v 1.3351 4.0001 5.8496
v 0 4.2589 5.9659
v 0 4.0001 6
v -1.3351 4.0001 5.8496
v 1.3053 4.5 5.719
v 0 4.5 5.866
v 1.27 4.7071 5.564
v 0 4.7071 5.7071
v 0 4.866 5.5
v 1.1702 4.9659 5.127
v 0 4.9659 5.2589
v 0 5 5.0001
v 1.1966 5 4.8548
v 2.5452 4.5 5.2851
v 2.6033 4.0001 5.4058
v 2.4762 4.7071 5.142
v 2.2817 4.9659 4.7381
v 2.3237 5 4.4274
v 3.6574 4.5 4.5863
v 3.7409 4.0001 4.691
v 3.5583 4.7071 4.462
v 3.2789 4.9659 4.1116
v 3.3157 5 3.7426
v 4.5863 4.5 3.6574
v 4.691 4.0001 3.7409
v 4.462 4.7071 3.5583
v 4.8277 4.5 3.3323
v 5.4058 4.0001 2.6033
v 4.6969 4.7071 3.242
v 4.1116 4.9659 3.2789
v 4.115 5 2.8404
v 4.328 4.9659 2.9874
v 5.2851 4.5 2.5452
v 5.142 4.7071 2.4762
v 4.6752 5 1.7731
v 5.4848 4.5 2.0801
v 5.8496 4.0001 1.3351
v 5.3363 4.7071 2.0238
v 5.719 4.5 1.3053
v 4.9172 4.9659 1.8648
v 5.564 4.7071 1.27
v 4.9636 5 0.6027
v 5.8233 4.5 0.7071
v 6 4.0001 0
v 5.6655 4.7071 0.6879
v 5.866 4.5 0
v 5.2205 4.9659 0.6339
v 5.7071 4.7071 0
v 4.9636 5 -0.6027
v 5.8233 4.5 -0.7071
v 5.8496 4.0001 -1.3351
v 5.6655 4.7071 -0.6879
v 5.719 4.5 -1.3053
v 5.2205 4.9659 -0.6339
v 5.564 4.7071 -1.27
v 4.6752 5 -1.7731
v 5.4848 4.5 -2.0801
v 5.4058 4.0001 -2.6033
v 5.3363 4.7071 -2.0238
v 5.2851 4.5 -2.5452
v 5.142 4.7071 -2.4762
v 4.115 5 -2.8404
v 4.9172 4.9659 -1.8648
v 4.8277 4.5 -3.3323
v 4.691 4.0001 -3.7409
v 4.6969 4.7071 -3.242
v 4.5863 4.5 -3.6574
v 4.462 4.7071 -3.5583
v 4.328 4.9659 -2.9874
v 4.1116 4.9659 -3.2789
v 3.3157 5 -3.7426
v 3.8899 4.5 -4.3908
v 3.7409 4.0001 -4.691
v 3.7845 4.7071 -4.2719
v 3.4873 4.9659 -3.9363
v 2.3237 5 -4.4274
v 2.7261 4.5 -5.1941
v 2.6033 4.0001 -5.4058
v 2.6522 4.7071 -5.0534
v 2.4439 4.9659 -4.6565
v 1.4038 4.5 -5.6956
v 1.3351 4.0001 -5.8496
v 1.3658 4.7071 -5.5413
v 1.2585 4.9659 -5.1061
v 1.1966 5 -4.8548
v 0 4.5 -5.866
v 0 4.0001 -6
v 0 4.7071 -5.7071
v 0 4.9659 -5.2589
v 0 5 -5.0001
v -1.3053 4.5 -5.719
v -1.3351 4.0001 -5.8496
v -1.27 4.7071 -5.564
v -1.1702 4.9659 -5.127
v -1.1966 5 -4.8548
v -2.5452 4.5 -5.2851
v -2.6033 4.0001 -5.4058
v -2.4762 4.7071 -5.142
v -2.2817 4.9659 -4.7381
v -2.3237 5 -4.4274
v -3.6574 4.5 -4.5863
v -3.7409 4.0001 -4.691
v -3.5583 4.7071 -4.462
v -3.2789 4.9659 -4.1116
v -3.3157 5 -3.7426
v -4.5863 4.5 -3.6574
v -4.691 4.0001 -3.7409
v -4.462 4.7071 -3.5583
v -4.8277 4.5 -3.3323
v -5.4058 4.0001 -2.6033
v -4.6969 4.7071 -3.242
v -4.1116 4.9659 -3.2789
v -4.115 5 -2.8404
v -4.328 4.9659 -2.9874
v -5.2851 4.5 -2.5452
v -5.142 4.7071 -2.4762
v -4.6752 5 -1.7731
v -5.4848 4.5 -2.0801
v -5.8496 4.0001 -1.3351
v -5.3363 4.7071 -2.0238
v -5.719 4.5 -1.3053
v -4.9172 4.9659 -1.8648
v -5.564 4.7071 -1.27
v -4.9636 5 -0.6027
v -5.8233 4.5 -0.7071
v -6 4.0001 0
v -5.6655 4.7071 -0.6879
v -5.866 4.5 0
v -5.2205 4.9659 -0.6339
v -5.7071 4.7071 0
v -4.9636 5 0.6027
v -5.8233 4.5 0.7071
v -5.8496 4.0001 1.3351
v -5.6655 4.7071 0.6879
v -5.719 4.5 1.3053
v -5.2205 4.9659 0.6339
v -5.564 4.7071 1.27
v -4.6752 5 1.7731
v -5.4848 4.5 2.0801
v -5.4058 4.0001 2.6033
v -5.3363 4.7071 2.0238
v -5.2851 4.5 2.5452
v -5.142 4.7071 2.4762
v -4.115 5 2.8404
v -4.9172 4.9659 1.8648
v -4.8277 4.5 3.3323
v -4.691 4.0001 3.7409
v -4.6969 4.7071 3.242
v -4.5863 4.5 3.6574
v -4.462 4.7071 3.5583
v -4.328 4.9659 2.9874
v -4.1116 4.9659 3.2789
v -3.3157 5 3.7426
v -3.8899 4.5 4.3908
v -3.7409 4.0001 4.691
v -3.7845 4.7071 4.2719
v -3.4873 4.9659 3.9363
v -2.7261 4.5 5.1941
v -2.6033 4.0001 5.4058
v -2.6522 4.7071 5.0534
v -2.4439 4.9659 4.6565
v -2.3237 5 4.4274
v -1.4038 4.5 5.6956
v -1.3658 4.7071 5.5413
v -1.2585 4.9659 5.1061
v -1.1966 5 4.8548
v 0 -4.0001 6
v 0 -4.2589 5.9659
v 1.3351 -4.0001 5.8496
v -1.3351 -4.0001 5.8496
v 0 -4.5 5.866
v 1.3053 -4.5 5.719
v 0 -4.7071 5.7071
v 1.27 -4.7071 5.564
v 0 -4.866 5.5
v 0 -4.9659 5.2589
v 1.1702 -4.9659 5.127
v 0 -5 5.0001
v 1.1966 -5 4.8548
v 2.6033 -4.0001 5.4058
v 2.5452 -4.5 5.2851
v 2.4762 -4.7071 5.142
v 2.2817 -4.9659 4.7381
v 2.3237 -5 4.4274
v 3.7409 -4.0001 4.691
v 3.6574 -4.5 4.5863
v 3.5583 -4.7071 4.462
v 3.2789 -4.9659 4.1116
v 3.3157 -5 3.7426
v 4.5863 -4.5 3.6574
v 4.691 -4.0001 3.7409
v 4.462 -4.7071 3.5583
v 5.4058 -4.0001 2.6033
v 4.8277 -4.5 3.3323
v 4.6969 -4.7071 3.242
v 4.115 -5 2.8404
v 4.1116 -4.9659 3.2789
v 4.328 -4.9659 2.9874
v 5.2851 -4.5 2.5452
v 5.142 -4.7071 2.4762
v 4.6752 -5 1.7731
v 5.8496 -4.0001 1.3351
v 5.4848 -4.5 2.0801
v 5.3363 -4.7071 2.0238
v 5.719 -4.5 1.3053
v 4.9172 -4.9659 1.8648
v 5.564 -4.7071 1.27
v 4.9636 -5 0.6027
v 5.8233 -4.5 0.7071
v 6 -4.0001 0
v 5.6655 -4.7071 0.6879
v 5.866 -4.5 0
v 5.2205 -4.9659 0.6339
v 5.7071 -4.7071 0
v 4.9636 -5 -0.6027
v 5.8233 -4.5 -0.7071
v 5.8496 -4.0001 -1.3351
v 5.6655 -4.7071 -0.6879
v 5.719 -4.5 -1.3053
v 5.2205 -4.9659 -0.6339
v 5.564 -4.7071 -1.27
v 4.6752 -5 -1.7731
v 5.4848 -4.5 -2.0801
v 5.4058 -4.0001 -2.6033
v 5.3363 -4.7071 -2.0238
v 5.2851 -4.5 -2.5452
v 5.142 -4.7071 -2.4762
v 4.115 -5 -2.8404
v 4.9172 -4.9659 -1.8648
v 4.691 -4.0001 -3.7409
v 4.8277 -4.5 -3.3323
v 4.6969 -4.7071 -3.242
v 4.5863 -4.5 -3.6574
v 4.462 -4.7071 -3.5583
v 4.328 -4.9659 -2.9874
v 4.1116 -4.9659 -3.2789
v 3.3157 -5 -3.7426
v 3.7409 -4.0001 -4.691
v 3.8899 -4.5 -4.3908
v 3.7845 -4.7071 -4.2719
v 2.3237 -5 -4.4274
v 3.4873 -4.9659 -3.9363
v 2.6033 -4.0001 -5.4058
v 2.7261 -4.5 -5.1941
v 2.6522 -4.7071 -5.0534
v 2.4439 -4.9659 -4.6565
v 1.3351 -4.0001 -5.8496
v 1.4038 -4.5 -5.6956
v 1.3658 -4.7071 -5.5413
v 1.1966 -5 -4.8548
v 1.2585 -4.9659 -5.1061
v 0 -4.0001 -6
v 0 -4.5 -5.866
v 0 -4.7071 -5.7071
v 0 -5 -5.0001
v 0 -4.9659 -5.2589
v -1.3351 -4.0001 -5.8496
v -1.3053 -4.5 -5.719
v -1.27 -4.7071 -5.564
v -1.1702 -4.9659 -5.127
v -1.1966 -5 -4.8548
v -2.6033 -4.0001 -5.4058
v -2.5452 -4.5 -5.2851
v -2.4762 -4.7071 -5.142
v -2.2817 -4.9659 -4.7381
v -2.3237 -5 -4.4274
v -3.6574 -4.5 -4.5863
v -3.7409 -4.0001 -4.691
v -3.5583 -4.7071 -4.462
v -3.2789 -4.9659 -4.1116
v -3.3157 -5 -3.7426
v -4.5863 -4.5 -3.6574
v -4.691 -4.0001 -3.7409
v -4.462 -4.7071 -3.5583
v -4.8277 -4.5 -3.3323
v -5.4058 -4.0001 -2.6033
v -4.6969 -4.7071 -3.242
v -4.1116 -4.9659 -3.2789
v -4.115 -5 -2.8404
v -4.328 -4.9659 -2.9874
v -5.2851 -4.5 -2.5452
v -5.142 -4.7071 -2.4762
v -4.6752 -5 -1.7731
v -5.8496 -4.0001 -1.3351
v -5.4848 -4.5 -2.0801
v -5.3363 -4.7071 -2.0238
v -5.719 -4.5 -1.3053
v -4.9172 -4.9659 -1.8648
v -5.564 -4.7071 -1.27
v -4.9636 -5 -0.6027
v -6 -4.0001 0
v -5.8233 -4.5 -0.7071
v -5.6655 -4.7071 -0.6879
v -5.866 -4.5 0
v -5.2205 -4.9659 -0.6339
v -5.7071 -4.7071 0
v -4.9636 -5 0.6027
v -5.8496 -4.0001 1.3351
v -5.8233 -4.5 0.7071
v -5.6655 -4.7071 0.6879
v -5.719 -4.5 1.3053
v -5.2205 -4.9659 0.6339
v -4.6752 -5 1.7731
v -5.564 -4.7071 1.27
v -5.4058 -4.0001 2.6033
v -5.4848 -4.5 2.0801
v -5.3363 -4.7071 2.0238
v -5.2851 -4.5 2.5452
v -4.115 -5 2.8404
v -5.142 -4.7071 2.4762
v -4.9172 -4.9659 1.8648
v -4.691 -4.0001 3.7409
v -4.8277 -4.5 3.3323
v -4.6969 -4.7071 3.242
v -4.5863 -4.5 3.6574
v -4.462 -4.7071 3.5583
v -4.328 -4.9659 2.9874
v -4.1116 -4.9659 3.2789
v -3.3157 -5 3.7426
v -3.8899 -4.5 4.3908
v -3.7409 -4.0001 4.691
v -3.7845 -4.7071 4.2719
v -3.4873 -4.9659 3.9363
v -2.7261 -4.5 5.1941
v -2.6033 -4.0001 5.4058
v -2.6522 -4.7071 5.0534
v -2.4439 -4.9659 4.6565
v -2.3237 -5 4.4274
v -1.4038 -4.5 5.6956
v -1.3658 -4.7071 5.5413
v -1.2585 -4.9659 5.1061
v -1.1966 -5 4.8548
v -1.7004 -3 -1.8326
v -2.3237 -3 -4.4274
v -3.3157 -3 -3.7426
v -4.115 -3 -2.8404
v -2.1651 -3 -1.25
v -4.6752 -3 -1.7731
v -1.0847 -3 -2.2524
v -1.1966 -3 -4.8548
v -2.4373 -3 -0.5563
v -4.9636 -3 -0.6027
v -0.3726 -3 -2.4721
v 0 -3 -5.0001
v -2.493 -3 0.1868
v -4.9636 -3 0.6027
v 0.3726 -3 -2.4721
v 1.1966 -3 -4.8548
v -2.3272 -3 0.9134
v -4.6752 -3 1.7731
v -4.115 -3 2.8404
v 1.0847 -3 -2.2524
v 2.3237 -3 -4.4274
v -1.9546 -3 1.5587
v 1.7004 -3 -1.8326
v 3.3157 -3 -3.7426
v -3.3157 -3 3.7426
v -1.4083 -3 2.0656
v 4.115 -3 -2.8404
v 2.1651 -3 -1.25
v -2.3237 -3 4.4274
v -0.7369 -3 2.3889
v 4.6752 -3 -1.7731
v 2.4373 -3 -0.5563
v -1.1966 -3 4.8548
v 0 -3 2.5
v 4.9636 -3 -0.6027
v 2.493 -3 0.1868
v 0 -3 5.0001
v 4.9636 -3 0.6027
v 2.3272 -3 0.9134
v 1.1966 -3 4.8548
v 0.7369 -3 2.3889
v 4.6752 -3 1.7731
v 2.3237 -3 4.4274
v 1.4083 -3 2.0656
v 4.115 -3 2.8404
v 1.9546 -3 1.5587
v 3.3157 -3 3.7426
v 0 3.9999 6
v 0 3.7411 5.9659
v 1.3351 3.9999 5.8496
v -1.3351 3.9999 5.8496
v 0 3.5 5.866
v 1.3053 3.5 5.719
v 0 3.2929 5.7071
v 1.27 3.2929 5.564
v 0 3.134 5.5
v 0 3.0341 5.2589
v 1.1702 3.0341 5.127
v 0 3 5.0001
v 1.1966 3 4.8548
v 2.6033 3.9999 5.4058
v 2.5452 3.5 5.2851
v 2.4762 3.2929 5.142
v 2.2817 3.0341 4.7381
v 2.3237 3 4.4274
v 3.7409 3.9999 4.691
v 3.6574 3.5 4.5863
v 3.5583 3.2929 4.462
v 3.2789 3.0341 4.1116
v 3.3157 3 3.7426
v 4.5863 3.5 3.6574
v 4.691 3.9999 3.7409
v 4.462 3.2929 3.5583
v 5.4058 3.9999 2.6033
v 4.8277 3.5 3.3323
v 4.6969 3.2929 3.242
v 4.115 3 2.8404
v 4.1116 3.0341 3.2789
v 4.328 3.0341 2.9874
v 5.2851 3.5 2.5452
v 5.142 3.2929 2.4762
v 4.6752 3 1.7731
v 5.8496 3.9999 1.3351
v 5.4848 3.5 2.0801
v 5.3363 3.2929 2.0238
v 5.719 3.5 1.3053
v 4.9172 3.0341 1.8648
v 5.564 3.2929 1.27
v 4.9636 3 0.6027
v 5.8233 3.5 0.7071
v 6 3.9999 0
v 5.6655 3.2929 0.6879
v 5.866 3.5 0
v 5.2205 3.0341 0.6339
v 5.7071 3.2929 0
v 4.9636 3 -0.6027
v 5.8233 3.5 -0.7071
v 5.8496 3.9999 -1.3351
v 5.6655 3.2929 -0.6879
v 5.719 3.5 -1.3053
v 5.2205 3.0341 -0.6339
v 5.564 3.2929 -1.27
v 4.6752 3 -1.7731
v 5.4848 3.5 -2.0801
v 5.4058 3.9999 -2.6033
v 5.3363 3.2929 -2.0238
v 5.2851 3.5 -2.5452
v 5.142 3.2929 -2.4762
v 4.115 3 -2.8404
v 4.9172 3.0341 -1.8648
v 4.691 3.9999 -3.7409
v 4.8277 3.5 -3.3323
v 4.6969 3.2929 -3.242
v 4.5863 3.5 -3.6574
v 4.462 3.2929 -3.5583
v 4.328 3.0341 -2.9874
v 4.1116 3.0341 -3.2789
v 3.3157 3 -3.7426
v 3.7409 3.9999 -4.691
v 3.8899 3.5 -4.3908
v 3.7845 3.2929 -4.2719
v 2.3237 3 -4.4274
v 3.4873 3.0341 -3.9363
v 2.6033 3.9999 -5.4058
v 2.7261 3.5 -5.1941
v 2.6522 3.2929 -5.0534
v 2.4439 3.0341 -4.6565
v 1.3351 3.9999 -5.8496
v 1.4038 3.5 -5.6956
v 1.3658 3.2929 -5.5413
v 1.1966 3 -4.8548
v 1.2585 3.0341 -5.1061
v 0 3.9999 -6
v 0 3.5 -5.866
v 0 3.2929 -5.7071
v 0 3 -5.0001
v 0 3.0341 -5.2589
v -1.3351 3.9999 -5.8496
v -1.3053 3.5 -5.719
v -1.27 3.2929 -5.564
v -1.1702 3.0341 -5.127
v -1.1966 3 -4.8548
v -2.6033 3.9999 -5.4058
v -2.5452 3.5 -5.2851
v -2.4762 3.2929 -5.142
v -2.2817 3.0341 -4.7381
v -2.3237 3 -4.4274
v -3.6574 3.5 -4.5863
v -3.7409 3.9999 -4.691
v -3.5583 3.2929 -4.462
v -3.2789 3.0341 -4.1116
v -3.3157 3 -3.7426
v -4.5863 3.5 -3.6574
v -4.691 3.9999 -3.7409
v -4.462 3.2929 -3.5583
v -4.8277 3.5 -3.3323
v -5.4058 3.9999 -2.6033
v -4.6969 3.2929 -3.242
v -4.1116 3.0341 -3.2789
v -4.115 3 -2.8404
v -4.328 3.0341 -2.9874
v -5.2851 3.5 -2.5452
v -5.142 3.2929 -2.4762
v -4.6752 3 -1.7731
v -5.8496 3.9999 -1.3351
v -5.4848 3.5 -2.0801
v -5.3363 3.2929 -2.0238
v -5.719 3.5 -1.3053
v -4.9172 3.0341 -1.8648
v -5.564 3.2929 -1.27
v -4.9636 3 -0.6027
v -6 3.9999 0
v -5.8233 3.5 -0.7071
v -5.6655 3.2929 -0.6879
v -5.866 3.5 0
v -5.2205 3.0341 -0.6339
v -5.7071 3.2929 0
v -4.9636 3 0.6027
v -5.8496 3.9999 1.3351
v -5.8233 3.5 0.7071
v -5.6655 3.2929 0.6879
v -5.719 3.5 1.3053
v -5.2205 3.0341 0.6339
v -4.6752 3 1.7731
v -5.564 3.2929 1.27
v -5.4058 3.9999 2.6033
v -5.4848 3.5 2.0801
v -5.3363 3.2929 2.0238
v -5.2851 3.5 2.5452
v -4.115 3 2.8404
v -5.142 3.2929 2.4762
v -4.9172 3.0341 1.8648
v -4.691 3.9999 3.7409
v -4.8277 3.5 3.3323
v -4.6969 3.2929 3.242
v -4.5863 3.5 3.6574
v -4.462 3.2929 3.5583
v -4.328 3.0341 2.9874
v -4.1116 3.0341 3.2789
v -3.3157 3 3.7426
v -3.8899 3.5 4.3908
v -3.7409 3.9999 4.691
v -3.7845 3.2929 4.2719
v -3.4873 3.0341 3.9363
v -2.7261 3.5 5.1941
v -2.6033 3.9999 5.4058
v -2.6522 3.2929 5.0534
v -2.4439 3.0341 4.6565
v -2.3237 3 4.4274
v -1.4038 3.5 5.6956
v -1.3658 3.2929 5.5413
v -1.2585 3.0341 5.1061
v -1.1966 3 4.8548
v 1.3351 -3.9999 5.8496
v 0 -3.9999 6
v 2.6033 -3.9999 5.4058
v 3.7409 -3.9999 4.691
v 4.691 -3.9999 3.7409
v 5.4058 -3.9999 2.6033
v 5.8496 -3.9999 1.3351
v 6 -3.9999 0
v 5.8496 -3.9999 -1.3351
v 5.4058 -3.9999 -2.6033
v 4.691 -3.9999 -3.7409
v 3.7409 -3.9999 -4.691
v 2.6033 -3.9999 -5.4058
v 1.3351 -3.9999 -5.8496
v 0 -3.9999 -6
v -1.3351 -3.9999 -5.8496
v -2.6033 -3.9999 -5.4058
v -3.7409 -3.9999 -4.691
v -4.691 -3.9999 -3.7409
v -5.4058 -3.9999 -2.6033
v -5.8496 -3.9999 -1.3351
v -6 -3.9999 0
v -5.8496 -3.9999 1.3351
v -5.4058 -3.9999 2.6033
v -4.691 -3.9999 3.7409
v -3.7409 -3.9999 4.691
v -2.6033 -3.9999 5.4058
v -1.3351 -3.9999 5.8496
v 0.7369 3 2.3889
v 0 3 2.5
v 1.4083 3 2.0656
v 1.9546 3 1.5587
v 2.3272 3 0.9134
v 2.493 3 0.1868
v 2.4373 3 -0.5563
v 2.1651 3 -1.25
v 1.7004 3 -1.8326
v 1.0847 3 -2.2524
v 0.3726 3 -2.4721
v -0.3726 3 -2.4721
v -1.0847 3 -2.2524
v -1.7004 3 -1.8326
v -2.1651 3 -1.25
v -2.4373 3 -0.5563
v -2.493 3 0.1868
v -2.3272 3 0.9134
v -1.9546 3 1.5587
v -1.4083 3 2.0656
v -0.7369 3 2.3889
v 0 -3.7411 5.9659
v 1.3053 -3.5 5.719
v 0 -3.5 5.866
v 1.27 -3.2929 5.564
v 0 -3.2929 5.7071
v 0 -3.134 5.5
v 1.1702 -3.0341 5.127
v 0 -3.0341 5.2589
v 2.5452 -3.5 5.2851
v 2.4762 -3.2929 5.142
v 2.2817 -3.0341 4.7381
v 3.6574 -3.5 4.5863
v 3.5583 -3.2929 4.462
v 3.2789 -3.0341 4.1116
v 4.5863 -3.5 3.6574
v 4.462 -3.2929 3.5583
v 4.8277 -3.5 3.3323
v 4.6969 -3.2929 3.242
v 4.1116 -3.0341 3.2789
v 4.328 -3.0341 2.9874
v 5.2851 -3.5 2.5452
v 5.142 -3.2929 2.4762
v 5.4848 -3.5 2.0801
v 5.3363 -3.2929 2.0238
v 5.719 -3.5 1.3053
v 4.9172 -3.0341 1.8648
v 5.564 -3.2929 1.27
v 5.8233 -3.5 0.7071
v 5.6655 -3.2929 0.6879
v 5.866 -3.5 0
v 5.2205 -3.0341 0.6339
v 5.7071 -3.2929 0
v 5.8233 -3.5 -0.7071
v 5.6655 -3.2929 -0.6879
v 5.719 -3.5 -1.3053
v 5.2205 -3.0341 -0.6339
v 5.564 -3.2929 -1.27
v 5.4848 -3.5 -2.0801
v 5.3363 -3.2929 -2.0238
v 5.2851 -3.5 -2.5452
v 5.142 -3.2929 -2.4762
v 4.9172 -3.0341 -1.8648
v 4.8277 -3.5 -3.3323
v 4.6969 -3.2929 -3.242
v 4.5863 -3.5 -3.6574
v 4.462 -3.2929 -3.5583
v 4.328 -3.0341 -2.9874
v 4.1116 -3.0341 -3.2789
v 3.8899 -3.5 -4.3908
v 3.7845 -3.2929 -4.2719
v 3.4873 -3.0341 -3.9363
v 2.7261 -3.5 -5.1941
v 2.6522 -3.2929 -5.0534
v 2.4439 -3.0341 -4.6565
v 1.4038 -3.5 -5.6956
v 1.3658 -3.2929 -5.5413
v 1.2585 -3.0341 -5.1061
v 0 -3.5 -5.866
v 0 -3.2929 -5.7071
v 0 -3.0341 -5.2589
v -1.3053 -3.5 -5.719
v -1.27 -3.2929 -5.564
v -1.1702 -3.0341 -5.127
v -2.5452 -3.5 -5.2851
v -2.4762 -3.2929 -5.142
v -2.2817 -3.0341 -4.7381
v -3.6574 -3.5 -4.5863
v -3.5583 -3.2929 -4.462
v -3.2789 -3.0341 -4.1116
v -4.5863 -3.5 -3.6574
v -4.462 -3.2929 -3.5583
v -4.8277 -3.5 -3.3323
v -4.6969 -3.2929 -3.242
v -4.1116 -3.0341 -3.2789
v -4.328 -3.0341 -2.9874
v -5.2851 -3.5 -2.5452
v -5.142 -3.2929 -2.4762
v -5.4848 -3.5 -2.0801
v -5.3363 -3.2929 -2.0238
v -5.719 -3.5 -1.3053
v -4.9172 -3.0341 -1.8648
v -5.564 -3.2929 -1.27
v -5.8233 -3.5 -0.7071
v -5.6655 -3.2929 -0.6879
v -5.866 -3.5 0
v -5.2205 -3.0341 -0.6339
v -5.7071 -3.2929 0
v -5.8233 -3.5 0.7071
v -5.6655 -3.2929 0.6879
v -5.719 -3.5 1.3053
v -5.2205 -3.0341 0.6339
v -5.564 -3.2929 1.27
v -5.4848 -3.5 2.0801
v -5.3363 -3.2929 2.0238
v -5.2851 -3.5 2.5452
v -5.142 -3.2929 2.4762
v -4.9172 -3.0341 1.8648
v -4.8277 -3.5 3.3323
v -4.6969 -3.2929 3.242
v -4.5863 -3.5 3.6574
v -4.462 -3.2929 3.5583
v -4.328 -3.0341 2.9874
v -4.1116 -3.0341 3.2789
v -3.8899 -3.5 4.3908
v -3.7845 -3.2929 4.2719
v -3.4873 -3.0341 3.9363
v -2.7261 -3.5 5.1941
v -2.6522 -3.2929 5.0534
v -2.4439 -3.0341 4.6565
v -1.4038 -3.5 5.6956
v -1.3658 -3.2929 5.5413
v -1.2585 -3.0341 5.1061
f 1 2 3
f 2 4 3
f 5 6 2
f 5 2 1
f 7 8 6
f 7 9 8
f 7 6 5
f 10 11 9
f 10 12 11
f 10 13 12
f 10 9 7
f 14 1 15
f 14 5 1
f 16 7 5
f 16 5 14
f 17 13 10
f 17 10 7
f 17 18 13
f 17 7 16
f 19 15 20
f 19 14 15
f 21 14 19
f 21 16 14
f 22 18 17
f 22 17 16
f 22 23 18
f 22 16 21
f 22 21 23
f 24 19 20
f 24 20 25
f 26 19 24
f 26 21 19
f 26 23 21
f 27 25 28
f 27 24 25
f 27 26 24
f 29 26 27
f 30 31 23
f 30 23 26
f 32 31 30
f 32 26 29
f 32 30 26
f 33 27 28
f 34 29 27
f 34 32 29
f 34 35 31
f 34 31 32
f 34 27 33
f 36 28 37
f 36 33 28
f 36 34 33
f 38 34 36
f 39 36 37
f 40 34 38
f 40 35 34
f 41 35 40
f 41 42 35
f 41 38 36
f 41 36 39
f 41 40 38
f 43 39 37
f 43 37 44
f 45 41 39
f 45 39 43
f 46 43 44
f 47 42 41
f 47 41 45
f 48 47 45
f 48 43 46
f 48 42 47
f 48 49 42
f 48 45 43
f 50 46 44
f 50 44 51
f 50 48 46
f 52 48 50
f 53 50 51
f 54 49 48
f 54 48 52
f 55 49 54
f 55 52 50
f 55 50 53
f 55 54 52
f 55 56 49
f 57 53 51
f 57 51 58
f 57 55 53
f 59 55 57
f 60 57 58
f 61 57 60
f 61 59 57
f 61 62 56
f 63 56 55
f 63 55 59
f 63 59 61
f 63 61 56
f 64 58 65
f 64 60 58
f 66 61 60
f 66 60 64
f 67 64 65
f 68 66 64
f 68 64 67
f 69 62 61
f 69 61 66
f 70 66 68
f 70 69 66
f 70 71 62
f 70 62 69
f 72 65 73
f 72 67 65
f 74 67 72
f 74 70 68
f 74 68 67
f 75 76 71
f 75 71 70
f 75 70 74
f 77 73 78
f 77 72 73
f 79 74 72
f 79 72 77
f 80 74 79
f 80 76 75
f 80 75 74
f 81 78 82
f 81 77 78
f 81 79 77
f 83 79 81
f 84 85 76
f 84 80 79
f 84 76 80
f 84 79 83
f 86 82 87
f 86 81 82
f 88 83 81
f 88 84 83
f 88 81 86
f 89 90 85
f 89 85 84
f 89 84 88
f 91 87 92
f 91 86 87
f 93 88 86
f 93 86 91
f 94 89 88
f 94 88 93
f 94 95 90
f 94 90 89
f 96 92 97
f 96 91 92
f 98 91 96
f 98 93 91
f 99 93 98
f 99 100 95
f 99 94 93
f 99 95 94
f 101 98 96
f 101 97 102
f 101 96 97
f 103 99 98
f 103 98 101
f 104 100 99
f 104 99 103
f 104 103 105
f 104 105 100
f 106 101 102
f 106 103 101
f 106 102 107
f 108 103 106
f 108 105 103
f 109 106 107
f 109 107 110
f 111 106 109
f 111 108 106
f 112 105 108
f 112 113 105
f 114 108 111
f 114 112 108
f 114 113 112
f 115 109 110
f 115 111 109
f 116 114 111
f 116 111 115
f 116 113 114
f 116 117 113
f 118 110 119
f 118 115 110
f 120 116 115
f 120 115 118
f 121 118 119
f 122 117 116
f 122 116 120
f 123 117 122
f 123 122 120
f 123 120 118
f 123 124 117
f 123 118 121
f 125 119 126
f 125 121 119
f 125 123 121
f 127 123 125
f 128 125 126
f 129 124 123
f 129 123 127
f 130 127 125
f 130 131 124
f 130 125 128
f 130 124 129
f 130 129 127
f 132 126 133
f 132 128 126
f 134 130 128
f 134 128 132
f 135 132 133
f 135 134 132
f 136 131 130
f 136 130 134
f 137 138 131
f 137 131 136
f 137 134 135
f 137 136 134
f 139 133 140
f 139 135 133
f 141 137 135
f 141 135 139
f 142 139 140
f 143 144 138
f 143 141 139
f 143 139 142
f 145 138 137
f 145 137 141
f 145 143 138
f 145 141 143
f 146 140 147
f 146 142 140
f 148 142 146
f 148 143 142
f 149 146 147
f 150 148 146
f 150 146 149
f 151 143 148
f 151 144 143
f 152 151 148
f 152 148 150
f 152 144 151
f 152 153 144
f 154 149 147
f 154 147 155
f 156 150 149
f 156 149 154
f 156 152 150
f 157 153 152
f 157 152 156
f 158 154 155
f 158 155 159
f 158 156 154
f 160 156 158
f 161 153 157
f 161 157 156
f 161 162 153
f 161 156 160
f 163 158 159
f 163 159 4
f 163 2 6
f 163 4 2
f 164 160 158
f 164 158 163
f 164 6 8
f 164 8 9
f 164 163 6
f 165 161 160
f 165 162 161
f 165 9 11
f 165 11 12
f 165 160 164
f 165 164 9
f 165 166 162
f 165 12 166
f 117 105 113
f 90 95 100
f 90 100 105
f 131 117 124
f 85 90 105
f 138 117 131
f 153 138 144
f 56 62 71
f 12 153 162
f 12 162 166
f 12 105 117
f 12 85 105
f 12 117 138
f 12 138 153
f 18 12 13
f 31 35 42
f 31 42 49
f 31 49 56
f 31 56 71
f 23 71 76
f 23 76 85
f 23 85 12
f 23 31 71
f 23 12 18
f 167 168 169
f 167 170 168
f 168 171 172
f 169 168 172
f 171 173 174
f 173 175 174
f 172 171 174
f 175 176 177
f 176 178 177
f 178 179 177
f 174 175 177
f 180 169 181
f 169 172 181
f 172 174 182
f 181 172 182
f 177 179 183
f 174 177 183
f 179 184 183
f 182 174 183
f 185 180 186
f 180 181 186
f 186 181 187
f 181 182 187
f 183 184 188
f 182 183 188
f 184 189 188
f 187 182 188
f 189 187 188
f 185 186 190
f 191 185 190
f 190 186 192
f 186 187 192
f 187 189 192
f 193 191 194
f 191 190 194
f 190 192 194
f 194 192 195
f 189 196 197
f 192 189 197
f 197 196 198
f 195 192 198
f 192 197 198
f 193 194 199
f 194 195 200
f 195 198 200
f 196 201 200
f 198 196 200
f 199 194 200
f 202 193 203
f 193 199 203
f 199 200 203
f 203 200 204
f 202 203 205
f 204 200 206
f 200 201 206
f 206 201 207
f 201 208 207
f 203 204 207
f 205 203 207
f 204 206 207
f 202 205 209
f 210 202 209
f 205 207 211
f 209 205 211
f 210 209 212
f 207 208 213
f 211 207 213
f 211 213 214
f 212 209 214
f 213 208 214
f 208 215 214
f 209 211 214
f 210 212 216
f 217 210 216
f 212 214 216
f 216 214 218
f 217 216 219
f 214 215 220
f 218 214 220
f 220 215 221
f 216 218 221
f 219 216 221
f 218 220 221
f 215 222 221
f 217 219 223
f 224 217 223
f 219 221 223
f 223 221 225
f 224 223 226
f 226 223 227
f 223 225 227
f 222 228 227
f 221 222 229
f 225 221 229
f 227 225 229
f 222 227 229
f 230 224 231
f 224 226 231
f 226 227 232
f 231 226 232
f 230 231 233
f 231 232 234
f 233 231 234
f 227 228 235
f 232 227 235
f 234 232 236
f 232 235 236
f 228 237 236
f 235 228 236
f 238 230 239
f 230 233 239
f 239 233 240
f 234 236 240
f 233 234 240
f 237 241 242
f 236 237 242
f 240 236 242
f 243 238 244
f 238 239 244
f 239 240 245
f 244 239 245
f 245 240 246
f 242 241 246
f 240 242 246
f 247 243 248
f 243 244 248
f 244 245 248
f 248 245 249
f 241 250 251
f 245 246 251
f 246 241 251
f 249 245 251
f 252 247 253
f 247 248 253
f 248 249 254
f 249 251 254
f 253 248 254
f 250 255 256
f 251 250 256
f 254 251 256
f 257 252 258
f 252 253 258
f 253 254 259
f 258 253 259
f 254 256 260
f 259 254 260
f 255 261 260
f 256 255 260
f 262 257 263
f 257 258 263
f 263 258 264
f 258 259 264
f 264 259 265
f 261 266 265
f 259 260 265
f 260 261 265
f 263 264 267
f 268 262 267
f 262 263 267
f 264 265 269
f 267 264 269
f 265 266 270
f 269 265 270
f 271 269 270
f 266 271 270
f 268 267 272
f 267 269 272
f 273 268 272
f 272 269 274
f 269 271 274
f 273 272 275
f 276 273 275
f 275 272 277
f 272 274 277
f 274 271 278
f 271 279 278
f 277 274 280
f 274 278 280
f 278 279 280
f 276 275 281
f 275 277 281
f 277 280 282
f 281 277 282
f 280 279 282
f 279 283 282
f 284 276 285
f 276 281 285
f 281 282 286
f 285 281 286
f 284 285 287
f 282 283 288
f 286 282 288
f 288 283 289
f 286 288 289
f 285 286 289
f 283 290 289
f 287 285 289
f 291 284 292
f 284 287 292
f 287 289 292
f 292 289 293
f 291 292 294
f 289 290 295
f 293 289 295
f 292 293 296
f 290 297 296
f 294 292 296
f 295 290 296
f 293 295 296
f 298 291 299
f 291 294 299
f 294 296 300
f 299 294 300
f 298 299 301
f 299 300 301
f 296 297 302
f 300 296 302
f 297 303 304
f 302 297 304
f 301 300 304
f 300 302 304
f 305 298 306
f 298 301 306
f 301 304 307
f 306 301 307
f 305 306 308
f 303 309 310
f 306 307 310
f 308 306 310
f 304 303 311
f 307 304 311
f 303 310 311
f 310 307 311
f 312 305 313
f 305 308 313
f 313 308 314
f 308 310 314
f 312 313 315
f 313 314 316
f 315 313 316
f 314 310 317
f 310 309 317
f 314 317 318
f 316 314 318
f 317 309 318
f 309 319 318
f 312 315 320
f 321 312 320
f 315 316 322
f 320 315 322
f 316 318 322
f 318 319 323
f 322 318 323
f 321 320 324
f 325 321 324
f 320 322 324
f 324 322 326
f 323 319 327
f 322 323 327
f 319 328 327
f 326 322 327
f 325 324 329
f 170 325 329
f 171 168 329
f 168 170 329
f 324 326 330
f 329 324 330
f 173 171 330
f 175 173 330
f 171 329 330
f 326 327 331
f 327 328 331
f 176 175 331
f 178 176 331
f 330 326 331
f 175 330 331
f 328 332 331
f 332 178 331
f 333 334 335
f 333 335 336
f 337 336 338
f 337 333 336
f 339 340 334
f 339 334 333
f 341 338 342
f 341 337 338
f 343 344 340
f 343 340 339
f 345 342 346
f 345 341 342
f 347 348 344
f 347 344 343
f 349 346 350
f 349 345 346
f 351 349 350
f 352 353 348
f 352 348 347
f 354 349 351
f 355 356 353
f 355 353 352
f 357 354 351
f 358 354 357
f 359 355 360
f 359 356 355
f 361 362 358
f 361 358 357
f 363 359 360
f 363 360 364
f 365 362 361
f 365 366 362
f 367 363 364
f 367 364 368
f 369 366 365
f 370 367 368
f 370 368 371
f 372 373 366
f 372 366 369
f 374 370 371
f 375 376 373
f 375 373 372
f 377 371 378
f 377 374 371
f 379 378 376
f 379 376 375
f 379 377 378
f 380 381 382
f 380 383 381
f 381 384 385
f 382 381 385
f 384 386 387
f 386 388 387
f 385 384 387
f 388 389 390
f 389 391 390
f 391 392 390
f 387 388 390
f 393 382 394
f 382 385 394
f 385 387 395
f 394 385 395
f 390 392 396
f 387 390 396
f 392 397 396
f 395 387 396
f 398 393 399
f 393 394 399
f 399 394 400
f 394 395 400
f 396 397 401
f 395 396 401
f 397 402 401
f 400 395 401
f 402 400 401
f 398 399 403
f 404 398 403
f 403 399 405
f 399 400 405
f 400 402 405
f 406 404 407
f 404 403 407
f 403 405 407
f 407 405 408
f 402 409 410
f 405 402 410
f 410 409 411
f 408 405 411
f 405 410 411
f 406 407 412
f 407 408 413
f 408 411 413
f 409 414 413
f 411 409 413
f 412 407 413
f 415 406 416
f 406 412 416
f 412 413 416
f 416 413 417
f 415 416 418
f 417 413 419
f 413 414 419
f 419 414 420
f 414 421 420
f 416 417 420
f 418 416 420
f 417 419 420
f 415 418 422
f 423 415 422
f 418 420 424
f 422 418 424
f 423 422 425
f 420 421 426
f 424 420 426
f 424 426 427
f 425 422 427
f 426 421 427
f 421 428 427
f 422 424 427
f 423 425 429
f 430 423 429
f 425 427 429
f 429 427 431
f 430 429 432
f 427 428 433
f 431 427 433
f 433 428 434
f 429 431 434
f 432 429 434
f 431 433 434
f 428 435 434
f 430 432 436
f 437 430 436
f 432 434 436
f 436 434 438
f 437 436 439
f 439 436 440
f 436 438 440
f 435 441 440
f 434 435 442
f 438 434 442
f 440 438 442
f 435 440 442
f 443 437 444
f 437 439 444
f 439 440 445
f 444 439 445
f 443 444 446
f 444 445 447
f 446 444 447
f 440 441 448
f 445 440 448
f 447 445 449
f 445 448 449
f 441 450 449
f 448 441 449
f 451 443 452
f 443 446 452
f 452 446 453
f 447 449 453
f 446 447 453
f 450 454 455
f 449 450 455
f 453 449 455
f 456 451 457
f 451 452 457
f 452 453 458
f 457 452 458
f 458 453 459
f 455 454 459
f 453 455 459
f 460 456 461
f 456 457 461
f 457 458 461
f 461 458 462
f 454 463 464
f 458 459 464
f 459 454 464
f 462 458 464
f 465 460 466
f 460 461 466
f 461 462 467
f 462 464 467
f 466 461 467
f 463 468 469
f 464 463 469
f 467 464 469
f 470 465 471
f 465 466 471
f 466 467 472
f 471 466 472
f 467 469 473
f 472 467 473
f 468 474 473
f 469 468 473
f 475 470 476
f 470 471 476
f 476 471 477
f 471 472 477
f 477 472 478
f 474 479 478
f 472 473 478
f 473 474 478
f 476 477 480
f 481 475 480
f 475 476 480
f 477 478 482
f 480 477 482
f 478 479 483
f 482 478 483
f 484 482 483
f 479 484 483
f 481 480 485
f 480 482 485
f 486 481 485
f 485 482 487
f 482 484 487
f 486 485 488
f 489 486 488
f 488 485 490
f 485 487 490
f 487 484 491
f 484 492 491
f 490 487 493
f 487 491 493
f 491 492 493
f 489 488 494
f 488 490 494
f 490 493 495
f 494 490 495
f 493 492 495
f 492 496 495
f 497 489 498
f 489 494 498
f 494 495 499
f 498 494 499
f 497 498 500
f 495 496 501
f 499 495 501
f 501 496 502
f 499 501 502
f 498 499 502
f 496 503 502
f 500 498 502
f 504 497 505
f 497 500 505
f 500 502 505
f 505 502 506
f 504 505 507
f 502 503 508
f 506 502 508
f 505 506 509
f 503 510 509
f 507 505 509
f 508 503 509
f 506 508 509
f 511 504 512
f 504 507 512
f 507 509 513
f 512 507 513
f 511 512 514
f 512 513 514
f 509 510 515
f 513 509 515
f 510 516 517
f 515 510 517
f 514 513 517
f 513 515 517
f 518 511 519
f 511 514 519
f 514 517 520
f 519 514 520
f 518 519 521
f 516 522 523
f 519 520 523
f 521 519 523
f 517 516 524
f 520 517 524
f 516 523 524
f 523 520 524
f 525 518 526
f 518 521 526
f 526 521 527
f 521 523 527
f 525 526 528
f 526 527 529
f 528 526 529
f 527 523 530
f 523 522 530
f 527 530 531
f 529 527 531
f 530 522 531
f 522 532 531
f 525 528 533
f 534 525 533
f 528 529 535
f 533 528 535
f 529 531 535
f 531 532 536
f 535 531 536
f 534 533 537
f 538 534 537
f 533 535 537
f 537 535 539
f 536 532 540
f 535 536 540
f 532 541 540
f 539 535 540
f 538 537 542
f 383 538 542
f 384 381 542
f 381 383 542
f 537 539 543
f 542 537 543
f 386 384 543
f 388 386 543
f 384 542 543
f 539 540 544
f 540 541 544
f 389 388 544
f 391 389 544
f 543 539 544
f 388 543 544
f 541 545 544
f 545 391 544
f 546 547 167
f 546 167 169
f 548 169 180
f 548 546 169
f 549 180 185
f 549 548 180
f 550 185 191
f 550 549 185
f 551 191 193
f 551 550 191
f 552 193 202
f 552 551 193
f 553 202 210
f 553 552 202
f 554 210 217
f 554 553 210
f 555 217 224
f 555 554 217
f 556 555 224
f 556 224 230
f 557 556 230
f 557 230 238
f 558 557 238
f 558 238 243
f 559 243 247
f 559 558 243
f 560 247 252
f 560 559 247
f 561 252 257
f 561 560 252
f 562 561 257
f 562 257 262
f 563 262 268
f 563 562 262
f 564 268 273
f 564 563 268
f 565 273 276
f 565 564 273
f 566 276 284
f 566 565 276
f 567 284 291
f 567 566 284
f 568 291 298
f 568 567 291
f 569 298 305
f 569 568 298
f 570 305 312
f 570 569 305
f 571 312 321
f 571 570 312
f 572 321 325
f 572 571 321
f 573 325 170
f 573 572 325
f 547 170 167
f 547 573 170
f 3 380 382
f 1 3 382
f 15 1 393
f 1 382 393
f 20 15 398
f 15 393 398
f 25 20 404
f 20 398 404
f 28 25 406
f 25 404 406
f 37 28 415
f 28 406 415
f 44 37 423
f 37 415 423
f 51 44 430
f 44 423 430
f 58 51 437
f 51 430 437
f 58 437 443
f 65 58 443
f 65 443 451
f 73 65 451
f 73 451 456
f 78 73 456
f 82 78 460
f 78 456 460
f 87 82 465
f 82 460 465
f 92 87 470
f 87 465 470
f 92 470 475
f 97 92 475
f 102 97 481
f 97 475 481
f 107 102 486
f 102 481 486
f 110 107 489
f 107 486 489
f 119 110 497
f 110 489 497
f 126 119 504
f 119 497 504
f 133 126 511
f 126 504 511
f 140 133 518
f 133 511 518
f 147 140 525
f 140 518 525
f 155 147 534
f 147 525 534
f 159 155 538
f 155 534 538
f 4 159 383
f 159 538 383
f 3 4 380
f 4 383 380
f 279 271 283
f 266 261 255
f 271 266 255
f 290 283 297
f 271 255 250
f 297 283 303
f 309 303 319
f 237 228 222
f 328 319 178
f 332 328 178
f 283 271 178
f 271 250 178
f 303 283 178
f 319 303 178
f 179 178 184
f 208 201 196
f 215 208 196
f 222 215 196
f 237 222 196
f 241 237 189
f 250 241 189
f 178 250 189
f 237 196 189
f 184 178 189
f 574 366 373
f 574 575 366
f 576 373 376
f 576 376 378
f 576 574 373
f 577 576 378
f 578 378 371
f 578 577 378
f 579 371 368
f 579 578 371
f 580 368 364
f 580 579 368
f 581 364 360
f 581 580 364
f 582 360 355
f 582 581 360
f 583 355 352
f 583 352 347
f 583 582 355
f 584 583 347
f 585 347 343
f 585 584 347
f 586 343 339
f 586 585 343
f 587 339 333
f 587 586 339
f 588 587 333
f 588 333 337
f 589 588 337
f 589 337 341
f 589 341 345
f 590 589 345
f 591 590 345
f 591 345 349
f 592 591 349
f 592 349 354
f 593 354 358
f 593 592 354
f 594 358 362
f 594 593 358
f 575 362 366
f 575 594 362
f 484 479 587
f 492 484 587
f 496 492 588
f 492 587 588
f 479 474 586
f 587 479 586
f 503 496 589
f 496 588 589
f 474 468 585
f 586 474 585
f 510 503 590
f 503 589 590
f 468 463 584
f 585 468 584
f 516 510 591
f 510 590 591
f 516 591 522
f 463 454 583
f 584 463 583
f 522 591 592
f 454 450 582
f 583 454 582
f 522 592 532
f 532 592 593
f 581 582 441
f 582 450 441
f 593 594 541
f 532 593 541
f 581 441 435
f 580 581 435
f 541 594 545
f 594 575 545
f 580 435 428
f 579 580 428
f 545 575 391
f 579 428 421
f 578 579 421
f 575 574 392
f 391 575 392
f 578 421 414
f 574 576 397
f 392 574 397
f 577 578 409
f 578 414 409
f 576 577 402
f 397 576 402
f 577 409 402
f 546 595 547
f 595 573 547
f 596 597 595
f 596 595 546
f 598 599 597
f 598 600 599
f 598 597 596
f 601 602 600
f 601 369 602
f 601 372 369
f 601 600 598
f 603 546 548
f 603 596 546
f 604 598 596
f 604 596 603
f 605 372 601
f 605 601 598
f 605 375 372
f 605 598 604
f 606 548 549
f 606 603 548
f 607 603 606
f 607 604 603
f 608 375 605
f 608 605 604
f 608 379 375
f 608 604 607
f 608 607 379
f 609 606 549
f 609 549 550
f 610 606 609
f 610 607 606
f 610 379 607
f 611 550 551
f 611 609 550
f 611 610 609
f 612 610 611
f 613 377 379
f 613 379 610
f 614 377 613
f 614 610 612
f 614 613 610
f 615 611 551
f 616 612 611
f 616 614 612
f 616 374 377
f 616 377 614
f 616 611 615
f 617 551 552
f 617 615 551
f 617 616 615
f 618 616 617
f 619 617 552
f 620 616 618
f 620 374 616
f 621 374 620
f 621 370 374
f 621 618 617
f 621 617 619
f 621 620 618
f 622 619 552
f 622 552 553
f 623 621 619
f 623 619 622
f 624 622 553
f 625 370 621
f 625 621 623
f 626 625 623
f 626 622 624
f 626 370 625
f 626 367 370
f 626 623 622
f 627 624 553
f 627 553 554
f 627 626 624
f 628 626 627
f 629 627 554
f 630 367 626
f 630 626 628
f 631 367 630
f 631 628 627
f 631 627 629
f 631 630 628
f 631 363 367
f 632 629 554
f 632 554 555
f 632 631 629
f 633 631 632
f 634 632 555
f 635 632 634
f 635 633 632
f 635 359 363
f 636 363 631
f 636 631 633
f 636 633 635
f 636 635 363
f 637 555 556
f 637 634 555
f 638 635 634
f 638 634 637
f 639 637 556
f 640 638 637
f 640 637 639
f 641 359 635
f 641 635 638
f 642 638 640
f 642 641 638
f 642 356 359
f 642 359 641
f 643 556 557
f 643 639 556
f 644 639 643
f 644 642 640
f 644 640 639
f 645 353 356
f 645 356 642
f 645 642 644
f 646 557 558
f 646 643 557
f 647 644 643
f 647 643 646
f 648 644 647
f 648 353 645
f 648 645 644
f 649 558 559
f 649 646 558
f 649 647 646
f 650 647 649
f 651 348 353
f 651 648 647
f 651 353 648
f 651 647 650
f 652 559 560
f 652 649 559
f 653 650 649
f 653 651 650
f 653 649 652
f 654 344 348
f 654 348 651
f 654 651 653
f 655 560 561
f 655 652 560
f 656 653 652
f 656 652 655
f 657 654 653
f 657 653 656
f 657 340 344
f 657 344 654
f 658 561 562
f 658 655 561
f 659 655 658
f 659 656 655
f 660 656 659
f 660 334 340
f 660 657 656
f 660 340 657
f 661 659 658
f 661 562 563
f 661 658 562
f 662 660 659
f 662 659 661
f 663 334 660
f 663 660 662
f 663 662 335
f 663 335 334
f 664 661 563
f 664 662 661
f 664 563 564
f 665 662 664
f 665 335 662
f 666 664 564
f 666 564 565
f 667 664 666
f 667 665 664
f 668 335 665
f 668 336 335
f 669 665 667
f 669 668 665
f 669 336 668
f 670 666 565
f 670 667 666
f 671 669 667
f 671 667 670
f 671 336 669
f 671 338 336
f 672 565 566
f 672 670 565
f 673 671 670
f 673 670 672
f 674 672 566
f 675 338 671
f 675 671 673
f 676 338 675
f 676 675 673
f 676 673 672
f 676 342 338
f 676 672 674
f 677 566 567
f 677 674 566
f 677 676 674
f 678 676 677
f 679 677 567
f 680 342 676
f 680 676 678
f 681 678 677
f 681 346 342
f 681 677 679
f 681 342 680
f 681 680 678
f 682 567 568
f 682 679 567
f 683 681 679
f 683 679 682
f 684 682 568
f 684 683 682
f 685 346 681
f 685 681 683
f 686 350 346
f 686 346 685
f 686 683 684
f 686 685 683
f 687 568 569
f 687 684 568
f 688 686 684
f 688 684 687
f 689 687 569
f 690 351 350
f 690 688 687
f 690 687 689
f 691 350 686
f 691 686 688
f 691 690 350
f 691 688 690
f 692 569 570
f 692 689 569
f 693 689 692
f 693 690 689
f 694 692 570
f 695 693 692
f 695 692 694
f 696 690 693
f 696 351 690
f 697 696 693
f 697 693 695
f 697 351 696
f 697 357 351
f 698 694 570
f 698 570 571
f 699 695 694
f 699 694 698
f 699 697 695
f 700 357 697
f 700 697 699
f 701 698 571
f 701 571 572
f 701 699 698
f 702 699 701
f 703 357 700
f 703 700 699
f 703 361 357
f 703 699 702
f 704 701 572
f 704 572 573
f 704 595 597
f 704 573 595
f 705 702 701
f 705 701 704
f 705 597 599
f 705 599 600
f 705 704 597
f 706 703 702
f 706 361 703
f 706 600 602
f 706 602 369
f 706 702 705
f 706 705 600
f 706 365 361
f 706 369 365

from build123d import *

# Parameters (mm, degrees)
SKETCH1_R           = 2.5
BOSS_EXTRUDE1_DEPTH = 3
SKETCH2_R           = 6
BOSS_EXTRUDE2_DEPTH = 2
FILLET1_R           = 1


with BuildPart() as part:
    # Sketch1 → Boss-Extrude1 (new body)
    with BuildSketch(Plane(origin=(0, 0, 0), x_dir=(1, 0, 0), z_dir=(0, 1, 0))):
        with Locations(Location((0, 0, 0), (0, 0, 270))):
            Circle(SKETCH1_R)
    extrude(amount=BOSS_EXTRUDE1_DEPTH)

    # Sketch2 → Boss-Extrude2 (add)
    with BuildSketch(Plane(origin=(0, 3, 0), x_dir=(1, 0, 0), z_dir=(0, 1, 0))):
        with Locations(Location((0, 0, 0), (0, 0, 270))):
            Circle(SKETCH2_R)
    extrude(amount=BOSS_EXTRUDE2_DEPTH)

    # Fillet1
    fillet1_edges = [part.edges().sort_by_distance(p)[0] for p in [
        (0, 3, -6),
        (0, 5, -6),
    ]]
    fillet(fillet1_edges, radius=FILLET1_R - 0.0001)  # a hair under: the kernel refuses the full size

    # Mirror1: part across plane


with BuildPart() as part_1:
    add(part.part)
    add(part.part.mirror(Plane.ZX))


solid = part_1.part
